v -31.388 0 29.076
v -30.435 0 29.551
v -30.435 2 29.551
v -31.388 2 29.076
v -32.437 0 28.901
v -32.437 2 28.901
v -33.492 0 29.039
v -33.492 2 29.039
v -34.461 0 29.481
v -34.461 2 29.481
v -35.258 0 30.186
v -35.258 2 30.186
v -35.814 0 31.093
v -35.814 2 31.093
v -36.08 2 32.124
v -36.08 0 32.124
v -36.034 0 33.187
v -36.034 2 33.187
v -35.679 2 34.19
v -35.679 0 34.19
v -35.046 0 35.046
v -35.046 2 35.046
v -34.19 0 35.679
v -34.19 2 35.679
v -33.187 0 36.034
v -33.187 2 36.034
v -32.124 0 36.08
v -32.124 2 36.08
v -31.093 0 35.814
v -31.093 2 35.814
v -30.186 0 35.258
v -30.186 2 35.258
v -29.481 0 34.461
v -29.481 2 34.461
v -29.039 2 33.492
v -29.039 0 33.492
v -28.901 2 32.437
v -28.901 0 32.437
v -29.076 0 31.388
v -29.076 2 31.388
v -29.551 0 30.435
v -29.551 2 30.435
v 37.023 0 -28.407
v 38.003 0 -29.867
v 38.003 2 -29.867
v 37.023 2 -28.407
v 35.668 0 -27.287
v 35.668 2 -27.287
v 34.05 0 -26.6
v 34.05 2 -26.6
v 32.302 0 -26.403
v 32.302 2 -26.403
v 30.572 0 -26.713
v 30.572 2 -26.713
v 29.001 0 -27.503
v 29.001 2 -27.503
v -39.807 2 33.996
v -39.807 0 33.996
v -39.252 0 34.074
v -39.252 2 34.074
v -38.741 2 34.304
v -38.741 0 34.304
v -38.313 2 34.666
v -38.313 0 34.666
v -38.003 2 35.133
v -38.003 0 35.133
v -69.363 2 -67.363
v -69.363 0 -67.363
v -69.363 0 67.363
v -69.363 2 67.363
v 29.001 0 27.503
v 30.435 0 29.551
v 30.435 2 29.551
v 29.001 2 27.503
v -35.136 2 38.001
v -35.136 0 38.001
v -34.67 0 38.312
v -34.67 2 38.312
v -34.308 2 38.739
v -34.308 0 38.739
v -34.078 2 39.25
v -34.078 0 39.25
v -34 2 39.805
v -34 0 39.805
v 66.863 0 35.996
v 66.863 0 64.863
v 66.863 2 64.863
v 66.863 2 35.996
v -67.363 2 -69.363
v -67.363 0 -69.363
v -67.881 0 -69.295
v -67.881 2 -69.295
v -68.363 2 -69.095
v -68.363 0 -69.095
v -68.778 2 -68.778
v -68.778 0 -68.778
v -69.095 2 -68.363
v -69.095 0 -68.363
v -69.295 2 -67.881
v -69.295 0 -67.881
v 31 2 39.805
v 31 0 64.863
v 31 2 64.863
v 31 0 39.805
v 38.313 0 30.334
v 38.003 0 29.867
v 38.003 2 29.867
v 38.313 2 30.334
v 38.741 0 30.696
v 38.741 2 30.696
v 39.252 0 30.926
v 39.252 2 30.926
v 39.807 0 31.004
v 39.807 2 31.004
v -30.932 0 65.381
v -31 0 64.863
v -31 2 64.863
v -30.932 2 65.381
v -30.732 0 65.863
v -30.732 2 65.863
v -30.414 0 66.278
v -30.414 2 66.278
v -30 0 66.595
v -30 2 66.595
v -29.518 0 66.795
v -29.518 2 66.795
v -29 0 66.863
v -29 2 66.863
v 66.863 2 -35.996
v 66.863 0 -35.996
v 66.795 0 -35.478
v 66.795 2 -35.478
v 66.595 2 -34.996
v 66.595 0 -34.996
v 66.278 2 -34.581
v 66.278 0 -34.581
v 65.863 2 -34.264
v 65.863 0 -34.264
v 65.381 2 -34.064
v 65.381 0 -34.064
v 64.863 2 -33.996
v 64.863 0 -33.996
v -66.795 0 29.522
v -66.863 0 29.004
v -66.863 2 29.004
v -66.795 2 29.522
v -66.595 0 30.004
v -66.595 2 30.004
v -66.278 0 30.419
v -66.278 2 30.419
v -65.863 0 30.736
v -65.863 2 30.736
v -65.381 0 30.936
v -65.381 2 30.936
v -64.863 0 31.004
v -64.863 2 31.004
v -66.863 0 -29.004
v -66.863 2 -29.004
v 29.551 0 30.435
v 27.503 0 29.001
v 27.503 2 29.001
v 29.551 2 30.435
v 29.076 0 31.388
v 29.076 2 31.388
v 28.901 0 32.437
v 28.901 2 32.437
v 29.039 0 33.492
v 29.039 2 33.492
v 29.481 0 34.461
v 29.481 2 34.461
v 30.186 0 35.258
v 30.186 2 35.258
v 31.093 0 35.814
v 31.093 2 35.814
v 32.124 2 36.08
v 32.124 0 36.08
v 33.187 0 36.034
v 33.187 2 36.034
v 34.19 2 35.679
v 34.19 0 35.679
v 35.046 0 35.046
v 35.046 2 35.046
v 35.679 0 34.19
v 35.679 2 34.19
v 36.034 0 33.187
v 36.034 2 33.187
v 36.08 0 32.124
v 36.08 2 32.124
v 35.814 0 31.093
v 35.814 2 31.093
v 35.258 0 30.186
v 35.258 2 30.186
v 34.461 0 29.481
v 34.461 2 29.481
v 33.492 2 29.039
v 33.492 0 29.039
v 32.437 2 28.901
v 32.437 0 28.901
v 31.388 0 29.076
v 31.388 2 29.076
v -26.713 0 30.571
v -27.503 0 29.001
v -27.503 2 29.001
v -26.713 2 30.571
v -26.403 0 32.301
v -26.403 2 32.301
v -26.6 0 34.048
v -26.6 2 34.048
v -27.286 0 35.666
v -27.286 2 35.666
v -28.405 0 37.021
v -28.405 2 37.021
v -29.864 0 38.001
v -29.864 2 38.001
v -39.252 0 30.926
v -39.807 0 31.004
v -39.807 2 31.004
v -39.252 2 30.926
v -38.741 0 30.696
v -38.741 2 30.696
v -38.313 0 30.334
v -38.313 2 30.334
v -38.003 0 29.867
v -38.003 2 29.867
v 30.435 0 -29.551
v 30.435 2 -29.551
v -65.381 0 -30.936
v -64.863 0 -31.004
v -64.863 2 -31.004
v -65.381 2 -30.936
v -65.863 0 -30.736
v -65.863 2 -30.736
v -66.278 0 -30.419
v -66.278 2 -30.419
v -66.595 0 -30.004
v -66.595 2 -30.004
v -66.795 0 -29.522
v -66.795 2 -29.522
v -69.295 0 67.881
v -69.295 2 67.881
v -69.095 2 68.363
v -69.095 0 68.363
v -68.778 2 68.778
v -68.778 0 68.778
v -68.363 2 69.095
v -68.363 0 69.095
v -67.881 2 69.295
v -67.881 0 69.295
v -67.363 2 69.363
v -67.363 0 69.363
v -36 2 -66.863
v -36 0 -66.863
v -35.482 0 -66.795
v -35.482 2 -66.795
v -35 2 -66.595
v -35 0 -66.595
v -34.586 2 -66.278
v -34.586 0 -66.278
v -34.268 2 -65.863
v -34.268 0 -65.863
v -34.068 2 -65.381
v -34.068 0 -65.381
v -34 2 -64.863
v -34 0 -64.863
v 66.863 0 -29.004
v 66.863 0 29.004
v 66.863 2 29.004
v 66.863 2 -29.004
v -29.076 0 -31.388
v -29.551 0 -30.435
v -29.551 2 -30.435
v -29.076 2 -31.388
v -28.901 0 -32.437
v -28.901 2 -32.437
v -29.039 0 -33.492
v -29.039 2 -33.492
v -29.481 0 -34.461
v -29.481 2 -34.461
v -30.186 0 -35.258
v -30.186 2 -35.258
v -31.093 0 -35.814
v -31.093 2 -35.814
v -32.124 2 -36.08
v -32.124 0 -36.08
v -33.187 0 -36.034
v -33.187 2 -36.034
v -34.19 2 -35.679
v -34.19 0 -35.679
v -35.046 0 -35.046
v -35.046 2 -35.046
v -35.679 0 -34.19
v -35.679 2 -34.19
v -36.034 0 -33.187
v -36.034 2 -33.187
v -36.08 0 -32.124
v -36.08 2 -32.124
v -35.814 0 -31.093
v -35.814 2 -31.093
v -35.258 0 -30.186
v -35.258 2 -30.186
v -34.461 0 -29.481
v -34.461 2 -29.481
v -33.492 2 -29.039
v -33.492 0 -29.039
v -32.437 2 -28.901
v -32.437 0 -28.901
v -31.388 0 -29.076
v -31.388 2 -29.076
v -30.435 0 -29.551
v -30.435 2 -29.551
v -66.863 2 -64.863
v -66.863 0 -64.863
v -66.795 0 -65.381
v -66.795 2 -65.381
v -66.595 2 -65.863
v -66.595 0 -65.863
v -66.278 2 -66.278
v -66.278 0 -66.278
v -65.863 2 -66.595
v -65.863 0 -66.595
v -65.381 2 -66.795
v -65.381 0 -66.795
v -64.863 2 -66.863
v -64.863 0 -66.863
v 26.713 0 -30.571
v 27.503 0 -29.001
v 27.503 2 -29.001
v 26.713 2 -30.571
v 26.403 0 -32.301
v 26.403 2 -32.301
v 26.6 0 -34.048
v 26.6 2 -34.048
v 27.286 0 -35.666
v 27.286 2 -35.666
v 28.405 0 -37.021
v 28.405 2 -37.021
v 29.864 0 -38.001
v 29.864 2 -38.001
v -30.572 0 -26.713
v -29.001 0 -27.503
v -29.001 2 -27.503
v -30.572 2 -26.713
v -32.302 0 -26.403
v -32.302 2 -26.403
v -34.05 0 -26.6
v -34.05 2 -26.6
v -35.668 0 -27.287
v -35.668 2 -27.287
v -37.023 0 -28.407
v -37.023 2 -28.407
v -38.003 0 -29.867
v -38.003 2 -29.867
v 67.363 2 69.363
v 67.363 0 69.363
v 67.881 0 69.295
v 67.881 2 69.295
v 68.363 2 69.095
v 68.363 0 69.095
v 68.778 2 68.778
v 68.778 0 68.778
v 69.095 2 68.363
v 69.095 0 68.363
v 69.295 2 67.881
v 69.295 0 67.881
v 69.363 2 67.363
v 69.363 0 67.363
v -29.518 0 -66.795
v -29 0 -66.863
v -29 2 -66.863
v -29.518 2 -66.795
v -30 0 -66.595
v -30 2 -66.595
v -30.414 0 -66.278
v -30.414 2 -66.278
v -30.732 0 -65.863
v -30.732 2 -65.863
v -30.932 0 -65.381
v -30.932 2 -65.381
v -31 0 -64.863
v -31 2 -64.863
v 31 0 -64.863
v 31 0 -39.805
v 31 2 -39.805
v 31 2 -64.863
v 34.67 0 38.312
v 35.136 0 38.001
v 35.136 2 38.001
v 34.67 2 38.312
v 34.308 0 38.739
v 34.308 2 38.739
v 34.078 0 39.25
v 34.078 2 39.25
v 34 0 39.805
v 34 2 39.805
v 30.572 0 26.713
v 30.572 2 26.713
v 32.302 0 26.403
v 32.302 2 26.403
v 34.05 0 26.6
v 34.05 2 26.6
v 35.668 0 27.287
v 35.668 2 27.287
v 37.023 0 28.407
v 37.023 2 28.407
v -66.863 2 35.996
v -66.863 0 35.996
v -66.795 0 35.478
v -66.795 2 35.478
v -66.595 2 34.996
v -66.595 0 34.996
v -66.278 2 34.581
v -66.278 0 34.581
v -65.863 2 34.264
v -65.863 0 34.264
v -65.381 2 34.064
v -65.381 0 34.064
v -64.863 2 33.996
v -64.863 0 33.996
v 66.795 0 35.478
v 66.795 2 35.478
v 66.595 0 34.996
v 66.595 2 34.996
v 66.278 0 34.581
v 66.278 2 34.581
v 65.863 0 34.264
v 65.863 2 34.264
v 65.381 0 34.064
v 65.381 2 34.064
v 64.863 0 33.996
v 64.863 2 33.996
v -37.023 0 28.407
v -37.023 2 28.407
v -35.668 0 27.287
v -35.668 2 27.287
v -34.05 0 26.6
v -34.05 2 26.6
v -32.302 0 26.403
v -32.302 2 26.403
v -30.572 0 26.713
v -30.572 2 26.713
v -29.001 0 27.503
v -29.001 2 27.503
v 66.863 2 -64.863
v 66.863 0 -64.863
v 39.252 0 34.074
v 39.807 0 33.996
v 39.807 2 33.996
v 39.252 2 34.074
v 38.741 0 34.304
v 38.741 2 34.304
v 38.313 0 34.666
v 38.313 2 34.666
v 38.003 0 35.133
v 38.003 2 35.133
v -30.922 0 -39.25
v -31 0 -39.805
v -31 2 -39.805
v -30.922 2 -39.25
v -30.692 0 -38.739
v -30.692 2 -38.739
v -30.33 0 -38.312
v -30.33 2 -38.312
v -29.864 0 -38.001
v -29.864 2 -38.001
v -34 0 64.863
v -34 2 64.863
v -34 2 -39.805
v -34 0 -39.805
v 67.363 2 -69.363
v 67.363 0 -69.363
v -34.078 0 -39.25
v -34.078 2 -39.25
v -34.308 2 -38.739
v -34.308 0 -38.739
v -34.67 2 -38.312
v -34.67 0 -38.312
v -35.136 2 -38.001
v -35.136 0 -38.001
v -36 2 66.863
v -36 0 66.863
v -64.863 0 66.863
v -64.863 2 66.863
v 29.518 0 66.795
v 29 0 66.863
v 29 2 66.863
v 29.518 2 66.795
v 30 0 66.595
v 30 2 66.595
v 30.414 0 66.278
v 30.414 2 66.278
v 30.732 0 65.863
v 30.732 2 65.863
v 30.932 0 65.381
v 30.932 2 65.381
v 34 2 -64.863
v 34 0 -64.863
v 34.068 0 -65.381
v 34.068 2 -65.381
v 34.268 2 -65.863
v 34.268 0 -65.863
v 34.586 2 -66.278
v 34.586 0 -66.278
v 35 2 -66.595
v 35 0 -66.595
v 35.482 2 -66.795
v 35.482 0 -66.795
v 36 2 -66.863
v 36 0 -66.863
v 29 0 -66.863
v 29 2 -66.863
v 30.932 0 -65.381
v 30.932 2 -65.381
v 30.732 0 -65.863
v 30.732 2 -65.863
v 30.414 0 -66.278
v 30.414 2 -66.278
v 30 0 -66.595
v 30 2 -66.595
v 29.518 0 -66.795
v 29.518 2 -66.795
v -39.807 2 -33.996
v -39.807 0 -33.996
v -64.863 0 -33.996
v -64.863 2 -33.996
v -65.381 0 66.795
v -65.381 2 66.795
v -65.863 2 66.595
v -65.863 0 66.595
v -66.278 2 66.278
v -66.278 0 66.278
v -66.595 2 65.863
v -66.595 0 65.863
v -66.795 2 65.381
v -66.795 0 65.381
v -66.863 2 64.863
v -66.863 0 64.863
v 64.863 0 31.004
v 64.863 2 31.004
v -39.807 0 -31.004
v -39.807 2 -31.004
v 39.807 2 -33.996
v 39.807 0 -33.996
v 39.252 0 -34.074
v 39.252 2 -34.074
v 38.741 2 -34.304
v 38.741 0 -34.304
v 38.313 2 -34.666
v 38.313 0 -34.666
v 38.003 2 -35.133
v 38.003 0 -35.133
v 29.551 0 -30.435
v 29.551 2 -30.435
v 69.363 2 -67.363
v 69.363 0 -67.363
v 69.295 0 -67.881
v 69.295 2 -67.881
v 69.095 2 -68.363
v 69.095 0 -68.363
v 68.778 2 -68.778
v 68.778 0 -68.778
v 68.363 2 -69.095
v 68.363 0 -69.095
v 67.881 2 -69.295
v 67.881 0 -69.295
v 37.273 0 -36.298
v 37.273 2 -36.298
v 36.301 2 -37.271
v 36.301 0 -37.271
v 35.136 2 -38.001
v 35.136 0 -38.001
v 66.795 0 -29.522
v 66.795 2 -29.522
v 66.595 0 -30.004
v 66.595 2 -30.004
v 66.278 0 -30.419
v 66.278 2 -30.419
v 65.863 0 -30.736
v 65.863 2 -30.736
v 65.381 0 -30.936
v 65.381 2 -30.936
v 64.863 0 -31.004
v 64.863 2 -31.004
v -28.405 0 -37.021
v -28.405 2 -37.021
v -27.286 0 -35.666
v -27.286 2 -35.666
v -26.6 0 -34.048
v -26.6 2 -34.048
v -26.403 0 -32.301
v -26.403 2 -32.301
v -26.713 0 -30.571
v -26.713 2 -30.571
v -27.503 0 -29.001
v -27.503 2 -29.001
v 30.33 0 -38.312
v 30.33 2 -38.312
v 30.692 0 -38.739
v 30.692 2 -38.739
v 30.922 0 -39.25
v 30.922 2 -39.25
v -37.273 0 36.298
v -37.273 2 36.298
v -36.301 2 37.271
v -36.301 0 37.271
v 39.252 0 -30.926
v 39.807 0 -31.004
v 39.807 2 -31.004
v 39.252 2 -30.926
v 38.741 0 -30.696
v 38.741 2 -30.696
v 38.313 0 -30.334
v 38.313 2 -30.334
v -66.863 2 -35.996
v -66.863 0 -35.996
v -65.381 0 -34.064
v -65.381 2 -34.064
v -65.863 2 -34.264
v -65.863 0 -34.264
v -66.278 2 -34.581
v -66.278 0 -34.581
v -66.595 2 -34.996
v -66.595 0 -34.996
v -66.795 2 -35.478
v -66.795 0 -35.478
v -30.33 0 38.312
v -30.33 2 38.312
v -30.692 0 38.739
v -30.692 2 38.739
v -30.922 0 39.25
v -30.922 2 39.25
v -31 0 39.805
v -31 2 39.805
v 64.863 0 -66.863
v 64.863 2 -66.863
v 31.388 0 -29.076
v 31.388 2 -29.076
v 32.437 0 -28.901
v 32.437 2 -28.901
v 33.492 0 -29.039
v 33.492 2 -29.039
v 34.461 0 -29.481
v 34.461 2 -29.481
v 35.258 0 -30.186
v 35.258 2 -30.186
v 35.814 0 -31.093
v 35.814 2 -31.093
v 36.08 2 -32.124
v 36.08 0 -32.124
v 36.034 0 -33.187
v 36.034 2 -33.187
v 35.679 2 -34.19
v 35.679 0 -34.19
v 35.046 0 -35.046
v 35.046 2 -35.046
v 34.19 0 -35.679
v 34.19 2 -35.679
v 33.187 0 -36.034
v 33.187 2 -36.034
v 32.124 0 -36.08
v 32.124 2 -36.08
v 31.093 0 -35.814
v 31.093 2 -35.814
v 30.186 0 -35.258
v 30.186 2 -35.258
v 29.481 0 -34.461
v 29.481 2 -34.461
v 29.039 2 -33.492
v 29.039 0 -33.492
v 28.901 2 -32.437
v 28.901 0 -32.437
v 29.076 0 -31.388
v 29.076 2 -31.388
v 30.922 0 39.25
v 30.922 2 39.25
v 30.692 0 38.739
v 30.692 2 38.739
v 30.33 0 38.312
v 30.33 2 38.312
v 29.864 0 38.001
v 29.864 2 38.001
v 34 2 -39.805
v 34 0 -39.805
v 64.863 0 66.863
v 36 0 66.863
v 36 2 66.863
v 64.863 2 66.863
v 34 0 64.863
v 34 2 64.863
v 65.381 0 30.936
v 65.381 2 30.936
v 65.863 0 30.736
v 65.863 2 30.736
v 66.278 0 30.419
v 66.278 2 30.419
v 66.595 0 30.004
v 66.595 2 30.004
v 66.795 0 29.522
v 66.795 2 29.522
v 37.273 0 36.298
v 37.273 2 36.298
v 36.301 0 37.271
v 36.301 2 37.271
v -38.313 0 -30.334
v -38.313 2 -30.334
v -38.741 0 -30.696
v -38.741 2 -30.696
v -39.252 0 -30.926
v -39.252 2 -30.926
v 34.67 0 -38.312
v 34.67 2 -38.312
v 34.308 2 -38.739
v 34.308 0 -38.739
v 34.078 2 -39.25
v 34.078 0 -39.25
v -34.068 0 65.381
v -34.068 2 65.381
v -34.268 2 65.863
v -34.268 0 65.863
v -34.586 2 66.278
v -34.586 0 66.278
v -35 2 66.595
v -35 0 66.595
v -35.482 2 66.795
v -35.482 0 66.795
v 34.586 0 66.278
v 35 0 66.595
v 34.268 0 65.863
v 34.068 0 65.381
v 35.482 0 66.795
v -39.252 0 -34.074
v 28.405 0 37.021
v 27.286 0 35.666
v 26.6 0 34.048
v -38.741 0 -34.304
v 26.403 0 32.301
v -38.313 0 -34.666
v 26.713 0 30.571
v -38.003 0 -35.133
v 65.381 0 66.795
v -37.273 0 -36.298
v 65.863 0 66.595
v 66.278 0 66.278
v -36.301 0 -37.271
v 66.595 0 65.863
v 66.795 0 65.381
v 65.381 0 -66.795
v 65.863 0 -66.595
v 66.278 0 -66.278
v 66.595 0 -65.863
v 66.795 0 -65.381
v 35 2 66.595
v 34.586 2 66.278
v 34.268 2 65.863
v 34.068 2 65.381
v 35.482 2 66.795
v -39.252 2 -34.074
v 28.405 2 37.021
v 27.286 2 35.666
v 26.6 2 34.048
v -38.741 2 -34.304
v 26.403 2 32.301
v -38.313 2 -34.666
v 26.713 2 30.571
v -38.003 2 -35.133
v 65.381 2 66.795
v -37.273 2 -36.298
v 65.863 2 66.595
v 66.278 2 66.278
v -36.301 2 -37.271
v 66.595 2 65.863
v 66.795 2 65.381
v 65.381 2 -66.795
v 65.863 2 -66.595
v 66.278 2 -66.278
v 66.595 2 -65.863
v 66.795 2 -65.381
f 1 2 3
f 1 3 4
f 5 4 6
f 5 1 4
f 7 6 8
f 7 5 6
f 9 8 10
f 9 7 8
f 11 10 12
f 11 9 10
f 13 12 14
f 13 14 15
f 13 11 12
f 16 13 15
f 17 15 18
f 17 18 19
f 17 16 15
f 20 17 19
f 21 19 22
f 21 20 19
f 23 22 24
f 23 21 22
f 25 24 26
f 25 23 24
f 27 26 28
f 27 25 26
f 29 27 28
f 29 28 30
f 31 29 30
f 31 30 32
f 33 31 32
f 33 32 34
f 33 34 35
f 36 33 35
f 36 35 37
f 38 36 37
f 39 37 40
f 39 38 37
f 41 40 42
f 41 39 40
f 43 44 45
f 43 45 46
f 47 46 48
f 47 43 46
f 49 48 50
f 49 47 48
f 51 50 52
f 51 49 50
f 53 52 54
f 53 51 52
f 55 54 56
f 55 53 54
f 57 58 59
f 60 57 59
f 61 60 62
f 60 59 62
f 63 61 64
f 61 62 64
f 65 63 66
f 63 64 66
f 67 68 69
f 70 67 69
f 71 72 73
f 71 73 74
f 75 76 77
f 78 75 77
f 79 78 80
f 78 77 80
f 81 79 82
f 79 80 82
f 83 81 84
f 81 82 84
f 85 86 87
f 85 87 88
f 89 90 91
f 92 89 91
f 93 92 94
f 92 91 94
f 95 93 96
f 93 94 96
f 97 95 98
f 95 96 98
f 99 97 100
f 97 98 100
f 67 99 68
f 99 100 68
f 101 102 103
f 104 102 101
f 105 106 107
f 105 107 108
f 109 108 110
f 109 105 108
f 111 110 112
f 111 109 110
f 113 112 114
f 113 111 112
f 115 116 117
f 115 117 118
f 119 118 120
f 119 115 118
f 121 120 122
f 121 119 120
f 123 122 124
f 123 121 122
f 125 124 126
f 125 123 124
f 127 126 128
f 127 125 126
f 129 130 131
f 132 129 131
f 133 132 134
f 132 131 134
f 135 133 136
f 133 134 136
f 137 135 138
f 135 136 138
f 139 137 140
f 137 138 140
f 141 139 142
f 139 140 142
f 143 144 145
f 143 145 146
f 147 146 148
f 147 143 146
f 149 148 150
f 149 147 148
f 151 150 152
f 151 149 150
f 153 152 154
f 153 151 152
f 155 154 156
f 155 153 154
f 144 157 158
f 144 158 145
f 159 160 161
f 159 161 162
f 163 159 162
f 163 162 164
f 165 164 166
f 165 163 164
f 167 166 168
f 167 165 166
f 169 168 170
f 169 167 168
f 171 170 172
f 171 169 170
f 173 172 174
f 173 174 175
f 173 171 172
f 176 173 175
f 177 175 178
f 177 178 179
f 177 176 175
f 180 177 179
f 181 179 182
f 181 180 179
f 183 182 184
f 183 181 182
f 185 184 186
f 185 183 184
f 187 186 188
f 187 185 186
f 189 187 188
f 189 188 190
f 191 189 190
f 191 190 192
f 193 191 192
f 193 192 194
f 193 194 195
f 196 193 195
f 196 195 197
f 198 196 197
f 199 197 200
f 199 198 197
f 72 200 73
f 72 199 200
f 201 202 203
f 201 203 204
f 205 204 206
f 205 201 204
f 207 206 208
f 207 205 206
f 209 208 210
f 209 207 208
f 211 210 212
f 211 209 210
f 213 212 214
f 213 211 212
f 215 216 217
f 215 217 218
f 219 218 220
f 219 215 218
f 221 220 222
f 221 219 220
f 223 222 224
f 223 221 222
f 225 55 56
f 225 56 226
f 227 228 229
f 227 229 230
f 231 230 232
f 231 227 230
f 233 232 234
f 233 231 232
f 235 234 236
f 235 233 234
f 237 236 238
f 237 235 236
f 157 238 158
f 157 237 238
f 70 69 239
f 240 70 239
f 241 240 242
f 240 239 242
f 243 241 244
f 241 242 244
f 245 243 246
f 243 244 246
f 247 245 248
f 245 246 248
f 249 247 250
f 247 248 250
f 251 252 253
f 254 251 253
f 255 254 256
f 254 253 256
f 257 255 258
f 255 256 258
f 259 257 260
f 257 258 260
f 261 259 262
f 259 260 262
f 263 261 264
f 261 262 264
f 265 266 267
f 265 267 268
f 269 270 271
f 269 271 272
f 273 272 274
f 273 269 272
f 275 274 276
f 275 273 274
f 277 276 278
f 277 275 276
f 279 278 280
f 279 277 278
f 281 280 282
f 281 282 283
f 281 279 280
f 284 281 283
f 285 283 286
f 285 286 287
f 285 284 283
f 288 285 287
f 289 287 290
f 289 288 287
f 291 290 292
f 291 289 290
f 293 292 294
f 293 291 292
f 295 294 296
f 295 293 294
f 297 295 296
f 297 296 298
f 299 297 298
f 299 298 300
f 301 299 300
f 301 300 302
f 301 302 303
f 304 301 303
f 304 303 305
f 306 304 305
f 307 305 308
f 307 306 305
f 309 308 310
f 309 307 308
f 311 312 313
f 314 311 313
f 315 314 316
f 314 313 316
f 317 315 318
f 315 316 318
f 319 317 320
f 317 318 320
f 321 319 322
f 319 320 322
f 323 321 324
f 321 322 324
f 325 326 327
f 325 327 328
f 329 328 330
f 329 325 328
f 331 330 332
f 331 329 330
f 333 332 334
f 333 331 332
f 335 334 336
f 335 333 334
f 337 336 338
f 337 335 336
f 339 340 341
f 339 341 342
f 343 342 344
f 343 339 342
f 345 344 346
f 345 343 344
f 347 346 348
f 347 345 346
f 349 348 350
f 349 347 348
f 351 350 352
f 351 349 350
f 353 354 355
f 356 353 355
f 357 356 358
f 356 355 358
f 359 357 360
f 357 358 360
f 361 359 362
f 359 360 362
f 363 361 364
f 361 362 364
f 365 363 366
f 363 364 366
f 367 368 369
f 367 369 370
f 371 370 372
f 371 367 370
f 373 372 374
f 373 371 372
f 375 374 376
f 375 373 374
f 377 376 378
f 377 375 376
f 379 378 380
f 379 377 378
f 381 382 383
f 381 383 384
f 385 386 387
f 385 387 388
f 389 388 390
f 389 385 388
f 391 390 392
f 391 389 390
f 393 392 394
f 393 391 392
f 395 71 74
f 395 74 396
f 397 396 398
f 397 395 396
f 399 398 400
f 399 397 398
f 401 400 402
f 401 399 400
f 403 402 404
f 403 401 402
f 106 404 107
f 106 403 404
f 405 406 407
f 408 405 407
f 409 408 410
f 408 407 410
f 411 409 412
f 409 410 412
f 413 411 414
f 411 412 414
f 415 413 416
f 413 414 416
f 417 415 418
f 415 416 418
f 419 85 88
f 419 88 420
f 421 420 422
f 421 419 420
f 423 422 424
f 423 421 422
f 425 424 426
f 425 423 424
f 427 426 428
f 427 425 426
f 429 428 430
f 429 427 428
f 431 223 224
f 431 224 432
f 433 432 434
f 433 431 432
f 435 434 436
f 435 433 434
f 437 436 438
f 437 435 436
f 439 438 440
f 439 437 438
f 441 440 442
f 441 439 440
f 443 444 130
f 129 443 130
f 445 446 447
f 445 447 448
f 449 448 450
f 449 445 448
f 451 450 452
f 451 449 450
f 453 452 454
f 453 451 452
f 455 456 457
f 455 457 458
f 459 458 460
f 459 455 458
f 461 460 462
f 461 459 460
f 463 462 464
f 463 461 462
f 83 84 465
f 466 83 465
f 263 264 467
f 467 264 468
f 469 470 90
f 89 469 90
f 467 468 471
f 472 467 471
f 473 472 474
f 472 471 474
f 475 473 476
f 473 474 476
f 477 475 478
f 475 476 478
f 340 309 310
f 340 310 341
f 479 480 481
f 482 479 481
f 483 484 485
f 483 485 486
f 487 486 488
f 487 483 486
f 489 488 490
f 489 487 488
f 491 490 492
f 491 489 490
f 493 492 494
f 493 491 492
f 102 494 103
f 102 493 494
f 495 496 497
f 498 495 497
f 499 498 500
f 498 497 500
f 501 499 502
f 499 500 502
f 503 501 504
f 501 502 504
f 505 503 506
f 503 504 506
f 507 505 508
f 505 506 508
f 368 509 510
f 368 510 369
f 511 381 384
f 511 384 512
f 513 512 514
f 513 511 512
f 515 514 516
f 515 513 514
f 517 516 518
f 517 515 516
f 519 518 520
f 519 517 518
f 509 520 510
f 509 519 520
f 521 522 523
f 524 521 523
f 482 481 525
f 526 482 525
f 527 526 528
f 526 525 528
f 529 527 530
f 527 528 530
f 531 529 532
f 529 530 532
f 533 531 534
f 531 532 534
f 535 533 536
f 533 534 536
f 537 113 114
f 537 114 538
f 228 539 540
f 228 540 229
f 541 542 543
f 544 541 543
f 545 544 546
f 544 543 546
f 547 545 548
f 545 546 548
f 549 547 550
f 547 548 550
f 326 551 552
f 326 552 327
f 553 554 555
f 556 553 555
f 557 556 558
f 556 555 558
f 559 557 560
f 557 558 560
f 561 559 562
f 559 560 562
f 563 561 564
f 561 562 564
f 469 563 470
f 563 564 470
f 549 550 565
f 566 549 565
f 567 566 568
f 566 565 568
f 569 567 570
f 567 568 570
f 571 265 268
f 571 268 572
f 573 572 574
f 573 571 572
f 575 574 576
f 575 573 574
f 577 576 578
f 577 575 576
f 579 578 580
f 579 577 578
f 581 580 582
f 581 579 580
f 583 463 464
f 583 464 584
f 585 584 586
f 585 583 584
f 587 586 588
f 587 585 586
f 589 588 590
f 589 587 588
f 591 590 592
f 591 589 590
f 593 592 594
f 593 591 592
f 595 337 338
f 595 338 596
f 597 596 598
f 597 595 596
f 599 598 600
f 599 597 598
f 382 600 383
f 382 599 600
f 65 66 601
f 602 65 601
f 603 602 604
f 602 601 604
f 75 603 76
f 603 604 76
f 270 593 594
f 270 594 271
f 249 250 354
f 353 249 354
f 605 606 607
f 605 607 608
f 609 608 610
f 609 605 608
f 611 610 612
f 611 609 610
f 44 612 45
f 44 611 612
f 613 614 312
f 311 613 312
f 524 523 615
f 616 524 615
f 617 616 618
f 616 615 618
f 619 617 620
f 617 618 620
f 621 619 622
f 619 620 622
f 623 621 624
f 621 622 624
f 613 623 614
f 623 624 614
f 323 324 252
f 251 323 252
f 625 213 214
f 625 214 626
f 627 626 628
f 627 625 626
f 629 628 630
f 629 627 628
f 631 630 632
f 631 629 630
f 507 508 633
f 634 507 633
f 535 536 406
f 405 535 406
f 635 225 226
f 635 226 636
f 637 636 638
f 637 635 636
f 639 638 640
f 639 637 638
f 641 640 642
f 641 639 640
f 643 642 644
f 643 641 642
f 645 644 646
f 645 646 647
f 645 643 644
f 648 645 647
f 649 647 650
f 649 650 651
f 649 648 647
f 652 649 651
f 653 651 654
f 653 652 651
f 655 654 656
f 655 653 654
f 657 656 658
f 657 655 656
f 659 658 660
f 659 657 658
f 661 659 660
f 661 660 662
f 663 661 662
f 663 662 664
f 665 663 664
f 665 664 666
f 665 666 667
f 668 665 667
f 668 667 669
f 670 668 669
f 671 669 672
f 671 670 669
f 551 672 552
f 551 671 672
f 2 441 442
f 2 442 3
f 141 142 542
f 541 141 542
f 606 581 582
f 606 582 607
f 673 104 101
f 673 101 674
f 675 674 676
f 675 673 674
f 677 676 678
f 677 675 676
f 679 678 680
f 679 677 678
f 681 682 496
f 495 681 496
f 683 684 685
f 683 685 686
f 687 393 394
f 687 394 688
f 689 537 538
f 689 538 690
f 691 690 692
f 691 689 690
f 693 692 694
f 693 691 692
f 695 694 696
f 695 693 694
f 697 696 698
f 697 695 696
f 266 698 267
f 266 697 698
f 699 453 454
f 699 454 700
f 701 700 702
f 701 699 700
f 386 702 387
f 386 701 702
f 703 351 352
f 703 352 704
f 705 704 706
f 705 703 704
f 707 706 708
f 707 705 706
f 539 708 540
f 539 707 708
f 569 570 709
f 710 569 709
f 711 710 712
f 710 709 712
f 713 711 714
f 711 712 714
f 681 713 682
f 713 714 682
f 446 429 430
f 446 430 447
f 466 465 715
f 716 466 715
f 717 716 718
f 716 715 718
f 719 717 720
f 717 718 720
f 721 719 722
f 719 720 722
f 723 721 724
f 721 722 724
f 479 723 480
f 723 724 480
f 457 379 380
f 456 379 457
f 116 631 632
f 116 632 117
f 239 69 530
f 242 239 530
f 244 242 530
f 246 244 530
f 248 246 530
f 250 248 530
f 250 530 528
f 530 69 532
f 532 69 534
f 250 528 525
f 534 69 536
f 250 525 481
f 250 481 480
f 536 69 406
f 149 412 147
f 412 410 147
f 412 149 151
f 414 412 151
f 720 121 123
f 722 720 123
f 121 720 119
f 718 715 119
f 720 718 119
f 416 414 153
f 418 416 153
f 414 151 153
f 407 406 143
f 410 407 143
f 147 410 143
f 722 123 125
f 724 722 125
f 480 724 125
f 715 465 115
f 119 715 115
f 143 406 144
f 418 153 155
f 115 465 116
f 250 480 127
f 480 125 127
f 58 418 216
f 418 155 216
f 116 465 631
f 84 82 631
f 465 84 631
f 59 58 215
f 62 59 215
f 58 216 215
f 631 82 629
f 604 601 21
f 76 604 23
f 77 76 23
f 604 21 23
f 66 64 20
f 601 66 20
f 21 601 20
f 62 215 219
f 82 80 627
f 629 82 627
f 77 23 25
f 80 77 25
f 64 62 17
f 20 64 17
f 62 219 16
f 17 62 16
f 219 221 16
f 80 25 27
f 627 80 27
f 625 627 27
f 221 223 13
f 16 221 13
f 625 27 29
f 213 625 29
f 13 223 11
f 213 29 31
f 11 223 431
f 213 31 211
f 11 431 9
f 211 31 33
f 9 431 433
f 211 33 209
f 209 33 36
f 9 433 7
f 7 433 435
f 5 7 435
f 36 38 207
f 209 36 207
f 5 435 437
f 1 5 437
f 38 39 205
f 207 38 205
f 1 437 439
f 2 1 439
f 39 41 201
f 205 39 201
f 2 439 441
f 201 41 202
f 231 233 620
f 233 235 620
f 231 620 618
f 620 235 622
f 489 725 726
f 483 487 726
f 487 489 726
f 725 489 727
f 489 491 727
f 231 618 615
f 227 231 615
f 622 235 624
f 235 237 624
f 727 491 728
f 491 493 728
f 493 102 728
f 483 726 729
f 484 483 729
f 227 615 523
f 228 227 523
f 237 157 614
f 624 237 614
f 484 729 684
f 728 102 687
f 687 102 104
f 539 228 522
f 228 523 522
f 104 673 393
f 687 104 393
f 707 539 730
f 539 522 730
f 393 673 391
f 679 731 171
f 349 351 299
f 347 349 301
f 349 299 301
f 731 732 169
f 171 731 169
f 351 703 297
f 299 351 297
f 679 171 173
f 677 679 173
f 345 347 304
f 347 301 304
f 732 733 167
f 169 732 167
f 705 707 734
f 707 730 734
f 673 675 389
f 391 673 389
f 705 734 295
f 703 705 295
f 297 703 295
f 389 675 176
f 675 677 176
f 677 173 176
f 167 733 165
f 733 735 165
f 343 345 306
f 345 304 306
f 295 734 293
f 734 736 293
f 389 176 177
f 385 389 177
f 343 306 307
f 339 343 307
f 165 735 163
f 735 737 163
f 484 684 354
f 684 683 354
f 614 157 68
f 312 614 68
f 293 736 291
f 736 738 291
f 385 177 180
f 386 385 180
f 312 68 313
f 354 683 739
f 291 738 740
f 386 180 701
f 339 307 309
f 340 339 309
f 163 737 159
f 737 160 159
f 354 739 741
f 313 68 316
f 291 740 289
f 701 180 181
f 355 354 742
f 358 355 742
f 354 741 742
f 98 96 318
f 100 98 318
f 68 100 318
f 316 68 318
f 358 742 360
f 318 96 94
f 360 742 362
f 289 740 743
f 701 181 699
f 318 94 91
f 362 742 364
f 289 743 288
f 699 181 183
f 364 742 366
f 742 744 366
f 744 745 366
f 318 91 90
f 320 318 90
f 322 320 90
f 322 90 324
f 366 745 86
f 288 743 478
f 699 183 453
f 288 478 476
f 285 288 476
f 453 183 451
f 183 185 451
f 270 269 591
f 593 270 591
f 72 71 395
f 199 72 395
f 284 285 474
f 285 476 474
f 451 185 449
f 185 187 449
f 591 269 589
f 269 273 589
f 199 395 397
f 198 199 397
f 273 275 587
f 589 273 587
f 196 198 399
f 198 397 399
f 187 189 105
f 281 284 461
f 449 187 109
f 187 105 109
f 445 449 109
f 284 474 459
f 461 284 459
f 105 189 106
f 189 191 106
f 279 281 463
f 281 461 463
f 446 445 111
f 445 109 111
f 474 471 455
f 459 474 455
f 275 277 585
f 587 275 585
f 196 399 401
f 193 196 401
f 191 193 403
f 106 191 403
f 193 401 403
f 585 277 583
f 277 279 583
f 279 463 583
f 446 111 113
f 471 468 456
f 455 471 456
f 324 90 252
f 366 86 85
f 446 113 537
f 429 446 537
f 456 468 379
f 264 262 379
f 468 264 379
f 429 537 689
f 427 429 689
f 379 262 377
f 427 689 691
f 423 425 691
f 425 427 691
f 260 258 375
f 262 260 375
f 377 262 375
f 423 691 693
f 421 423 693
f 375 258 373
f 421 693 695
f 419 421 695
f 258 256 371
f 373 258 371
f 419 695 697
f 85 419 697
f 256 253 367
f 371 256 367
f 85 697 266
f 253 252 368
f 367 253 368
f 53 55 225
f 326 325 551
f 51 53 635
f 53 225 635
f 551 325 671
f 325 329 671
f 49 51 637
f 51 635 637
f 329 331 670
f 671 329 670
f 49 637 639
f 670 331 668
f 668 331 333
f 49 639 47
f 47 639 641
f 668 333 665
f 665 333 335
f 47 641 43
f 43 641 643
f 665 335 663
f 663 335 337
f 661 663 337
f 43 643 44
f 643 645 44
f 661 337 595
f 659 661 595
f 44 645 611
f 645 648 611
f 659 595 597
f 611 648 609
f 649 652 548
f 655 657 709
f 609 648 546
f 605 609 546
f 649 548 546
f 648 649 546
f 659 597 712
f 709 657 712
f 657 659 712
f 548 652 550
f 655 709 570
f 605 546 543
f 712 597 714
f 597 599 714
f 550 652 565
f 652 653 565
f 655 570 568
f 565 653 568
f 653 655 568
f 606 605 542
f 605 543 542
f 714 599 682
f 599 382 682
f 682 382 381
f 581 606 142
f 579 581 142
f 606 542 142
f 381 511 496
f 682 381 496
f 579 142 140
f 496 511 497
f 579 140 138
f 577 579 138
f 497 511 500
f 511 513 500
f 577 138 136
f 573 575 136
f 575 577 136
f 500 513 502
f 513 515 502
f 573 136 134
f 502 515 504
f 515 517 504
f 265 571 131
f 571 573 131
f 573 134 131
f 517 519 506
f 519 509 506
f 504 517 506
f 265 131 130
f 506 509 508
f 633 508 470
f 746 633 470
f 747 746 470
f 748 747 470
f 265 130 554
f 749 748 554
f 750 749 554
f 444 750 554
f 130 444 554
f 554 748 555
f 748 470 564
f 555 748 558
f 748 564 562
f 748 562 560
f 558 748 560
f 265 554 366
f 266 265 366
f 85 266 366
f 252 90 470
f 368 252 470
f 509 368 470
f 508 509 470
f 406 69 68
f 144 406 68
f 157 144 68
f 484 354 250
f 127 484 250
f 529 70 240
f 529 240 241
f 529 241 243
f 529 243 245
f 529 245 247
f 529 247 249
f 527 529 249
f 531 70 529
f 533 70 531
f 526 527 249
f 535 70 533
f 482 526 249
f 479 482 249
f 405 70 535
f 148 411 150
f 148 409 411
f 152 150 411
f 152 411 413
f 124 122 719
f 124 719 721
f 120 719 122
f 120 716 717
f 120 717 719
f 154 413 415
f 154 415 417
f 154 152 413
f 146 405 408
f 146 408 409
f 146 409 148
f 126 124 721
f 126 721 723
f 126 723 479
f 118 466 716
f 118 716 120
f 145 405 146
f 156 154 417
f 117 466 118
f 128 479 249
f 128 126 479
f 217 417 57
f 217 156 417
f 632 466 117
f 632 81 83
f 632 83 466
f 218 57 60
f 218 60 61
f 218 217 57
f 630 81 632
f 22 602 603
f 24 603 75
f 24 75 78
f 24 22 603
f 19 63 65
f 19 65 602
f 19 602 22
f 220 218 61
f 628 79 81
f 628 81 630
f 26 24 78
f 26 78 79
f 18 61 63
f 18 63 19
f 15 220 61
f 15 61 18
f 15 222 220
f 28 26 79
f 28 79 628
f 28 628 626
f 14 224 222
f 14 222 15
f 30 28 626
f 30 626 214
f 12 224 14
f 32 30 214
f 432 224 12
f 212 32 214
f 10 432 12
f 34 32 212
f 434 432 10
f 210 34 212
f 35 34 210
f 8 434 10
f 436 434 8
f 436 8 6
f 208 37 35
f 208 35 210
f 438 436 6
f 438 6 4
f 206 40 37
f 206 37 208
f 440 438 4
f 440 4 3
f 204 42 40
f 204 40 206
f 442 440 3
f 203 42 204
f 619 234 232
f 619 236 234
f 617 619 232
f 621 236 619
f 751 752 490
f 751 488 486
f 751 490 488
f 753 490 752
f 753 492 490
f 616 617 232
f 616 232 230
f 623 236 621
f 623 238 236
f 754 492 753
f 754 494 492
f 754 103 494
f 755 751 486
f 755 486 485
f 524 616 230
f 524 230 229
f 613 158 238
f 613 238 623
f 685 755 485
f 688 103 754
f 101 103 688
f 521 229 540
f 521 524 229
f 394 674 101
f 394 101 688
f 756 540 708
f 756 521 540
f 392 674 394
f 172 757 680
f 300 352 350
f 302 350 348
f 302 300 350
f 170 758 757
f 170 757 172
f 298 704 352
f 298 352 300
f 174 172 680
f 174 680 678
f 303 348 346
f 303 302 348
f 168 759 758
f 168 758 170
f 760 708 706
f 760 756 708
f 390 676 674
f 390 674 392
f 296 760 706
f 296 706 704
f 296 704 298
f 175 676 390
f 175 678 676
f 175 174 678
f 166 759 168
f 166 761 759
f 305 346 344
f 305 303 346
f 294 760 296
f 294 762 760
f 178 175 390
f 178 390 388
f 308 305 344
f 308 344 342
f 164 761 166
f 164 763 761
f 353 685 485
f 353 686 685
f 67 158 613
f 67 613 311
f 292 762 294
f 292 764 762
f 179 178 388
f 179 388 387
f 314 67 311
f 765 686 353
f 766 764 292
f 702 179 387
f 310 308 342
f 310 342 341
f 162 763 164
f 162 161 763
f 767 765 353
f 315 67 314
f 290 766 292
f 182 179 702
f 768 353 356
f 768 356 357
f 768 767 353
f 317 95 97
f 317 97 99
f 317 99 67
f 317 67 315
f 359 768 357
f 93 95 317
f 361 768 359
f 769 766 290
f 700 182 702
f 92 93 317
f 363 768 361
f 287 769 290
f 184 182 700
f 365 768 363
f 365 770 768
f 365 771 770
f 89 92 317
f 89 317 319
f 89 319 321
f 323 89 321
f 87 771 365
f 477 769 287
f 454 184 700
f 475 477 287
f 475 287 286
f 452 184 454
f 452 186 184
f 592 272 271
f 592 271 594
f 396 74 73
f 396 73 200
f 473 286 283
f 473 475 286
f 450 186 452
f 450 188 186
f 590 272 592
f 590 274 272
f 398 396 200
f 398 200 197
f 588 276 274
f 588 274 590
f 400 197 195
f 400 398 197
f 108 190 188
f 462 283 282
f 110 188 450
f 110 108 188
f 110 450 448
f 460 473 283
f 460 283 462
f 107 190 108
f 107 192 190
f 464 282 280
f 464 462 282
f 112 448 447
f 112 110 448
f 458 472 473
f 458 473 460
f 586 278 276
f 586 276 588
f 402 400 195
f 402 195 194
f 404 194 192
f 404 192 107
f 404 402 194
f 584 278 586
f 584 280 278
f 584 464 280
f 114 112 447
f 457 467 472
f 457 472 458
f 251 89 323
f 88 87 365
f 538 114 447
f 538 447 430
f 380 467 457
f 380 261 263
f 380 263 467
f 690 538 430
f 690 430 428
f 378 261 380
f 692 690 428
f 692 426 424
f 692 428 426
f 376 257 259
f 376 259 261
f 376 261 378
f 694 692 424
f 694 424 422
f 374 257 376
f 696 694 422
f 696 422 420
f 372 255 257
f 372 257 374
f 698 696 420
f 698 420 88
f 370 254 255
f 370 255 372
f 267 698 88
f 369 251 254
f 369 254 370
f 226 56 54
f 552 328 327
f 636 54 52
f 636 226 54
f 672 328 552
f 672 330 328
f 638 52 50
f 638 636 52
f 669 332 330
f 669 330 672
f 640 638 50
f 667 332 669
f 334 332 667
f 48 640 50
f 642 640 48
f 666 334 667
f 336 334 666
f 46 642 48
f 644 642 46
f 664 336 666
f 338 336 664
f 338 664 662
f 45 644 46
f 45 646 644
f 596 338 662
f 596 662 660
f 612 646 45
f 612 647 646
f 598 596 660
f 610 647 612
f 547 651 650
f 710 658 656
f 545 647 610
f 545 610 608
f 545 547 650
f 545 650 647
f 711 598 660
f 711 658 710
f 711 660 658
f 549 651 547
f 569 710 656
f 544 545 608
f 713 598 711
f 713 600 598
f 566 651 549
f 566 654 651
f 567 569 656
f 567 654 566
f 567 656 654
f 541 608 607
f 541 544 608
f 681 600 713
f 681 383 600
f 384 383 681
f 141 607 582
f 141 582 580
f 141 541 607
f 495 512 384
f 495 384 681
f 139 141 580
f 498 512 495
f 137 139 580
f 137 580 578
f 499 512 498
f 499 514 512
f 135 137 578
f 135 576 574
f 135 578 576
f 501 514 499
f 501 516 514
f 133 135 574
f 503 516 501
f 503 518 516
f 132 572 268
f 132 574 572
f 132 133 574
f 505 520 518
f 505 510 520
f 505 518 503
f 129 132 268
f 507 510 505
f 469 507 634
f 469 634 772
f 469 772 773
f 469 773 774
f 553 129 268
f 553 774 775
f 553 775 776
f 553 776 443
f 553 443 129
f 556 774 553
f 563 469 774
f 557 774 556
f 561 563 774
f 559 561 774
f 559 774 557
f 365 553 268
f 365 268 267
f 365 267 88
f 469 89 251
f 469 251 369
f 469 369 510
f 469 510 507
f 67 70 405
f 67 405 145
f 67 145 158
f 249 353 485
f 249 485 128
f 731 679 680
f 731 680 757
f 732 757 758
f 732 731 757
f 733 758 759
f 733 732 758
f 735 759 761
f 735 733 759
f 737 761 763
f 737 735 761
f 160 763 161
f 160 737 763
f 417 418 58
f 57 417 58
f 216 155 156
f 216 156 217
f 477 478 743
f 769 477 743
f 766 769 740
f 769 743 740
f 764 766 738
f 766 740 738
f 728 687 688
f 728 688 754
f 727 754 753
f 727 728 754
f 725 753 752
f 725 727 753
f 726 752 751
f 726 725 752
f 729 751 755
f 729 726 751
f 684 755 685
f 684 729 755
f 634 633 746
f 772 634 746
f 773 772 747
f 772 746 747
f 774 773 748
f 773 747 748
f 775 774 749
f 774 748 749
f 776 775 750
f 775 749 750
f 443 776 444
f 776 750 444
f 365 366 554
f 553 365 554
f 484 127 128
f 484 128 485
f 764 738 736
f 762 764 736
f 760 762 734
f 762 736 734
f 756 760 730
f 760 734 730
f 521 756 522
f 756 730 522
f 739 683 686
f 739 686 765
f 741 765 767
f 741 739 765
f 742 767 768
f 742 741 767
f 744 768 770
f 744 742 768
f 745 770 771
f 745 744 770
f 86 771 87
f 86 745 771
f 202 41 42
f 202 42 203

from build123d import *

# Parameters (mm, degrees)
BOSS_EXTRUDE2_DEPTH = 2


with BuildPart() as part:
    # Sketch1 → Boss-Extrude2 (new body)
    with BuildSketch(Plane(origin=(0, 0, 0), x_dir=(1, 0, 0), z_dir=(0, 1, 0))):
        with BuildLine():
            Line((69.363368179, -67.363368179), (69.363368179, 67.363368179))
            ThreePointArc((69.363368179, 67.363368179), (68.777581741, 68.777581741), (67.363368179, 69.363368179))
            Line((67.363368179, 69.363368179), (-67.363368179, 69.363368179))
            ThreePointArc((-67.363368179, 69.363368179), (-68.777581741, 68.777581741), (-69.363368179, 67.363368179))
            Line((-69.363368179, 67.363368179), (-69.363368179, -67.363368179))
            ThreePointArc((-69.363368179, -67.363368179), (-68.777581741, -68.777581741), (-67.363368179, -69.363368179))
            Line((-67.363368179, -69.363368179), (67.363368179, -69.363368179))
            ThreePointArc((67.363368179, -69.363368179), (68.777581741, -68.777581741), (69.363368179, -67.363368179))
        make_face()
        with BuildLine():
            Line((66.863368179, -64.863368179), (66.863368179, -35.99568434))
            ThreePointArc((66.863368179, -35.99568434), (66.277581741, -34.581470778), (64.863368179, -33.99568434))
            Line((64.863368179, -33.99568434), (39.806859174, -33.99568434))
            ThreePointArc((39.806859174, -33.99568434), (38.740619021, -34.303605165), (38.002696415, -35.132552404))
            ThreePointArc((38.002696415, -35.132552404), (36.814625157, -36.812077197), (35.135802469, -38.001140368))
            ThreePointArc((35.135802469, -38.001140368), (34.307605976, -38.739052609), (34, -39.804792947))
            Line((34, -39.804792947), (34, -64.863368179))
            ThreePointArc((34, -64.863368179), (34.585786438, -66.277581741), (36, -66.863368179))
            Line((36, -66.863368179), (64.863368179, -66.863368179))
            ThreePointArc((64.863368179, -66.863368179), (66.277581741, -66.277581741), (66.863368179, -64.863368179))
        make_face(mode=Mode.SUBTRACT)
        with BuildLine():
            Line((-64.863368179, 66.863368179), (-36, 66.863368179))
            ThreePointArc((-36, 66.863368179), (-34.585786438, 66.277581741), (-34, 64.863368179))
            Line((-34, 64.863368179), (-34, 39.804792947))
            ThreePointArc((-34, 39.804792947), (-34.307605976, 38.739052609), (-35.135802469, 38.001140368))
            ThreePointArc((-35.135802469, 38.001140368), (-36.814625157, 36.812077197), (-38.002696415, 35.132552404))
            ThreePointArc((-38.002696415, 35.132552404), (-38.740619021, 34.303605165), (-39.806859174, 33.99568434))
            Line((-39.806859174, 33.99568434), (-64.863368179, 33.99568434))
            ThreePointArc((-64.863368179, 33.99568434), (-66.277581741, 34.581470778), (-66.863368179, 35.99568434))
            Line((-66.863368179, 35.99568434), (-66.863368179, 64.863368179))
            ThreePointArc((-66.863368179, 64.863368179), (-66.277581741, 66.277581741), (-64.863368179, 66.863368179))
        make_face(mode=Mode.SUBTRACT)
        with BuildLine():
            Line((-66.863368179, -64.863368179), (-66.863368179, -35.99568434))
            ThreePointArc((-66.863368179, -35.99568434), (-66.277581741, -34.581470778), (-64.863368179, -33.99568434))
            Line((-64.863368179, -33.99568434), (-39.806859174, -33.99568434))
            ThreePointArc((-39.806859174, -33.99568434), (-38.740619021, -34.303605165), (-38.002696415, -35.132552404))
            ThreePointArc((-38.002696415, -35.132552404), (-36.814625157, -36.812077197), (-35.135802469, -38.001140368))
            ThreePointArc((-35.135802469, -38.001140368), (-34.307605976, -38.739052609), (-34, -39.804792947))
            Line((-34, -39.804792947), (-34, -64.863368179))
            ThreePointArc((-34, -64.863368179), (-34.585786438, -66.277581741), (-36, -66.863368179))
            Line((-36, -66.863368179), (-64.863368179, -66.863368179))
            ThreePointArc((-64.863368179, -66.863368179), (-66.277581741, -66.277581741), (-66.863368179, -64.863368179))
        make_face(mode=Mode.SUBTRACT)
        with BuildLine():
            Line((36, 66.863368179), (64.863368179, 66.863368179))
            ThreePointArc((64.863368179, 66.863368179), (66.277581741, 66.277581741), (66.863368179, 64.863368179))
            Line((66.863368179, 64.863368179), (66.863368179, 35.99568434))
            ThreePointArc((66.863368179, 35.99568434), (66.277581741, 34.581470778), (64.863368179, 33.99568434))
            Line((64.863368179, 33.99568434), (39.806859174, 33.99568434))
            ThreePointArc((39.806859174, 33.99568434), (38.740619021, 34.303605165), (38.002696415, 35.132552404))
            ThreePointArc((38.002696415, 35.132552404), (36.814625157, 36.812077197), (35.135802469, 38.001140368))
            ThreePointArc((35.135802469, 38.001140368), (34.307605976, 38.739052609), (34, 39.804792947))
            Line((34, 39.804792947), (34, 64.863368179))
            ThreePointArc((34, 64.863368179), (34.585786438, 66.277581741), (36, 66.863368179))
        make_face(mode=Mode.SUBTRACT)
        with BuildLine():
            Line((-30.435124829, 29.551052641), (-29.001183738, 27.50317253))
            ThreePointArc((-29.001183738, 27.50317253), (-34.049623523, 26.600112973), (-38.002696415, 29.867447596))
            ThreePointArc((-38.002696415, 29.867447596), (-38.740619021, 30.696394835), (-39.806859174, 31.00431566))
            Line((-39.806859174, 31.00431566), (-64.863368179, 31.00431566))
            ThreePointArc((-64.863368179, 31.00431566), (-66.277581741, 30.418529222), (-66.863368179, 29.00431566))
            Line((-66.863368179, 29.00431566), (-66.863368179, -29.00431566))
            ThreePointArc((-66.863368179, -29.00431566), (-66.277581741, -30.418529222), (-64.863368179, -31.00431566))
            Line((-64.863368179, -31.00431566), (-39.806859174, -31.00431566))
            ThreePointArc((-39.806859174, -31.00431566), (-38.740619021, -30.696394835), (-38.002696415, -29.867447596))
            ThreePointArc((-38.002696415, -29.867447596), (-34.049623523, -26.600112973), (-29.001183738, -27.50317253))
            Line((-29.001183738, -27.50317253), (-30.435124829, -29.551052641))
            ThreePointArc((-30.435124829, -29.551052641), (-35.045584412, -35.045584412), (-29.551052641, -30.435124829))
            Line((-29.551052641, -30.435124829), (-27.50317253, -29.001183738))
            ThreePointArc((-27.50317253, -29.001183738), (-26.599655537, -34.04788088), (-29.864197531, -38.001140368))
            ThreePointArc((-29.864197531, -38.001140368), (-30.692394024, -38.739052609), (-31, -39.804792947))
            Line((-31, -39.804792947), (-31, -64.863368179))
            ThreePointArc((-31, -64.863368179), (-30.414213562, -66.277581741), (-29, -66.863368179))
            Line((-29, -66.863368179), (29, -66.863368179))
            ThreePointArc((29, -66.863368179), (30.414213562, -66.277581741), (31, -64.863368179))
            Line((31, -64.863368179), (31, -39.804792947))
            ThreePointArc((31, -39.804792947), (30.692394024, -38.739052609), (29.864197531, -38.001140368))
            ThreePointArc((29.864197531, -38.001140368), (26.599655537, -34.04788088), (27.50317253, -29.001183738))
            Line((27.50317253, -29.001183738), (29.551052641, -30.435124829))
            ThreePointArc((29.551052641, -30.435124829), (35.045584412, -35.045584412), (30.435124829, -29.551052641))
            Line((30.435124829, -29.551052641), (29.001183738, -27.50317253))
            ThreePointArc((29.001183738, -27.50317253), (34.049623523, -26.600112973), (38.002696415, -29.867447596))
            ThreePointArc((38.002696415, -29.867447596), (38.740619021, -30.696394835), (39.806859174, -31.00431566))
            Line((39.806859174, -31.00431566), (64.863368179, -31.00431566))
            ThreePointArc((64.863368179, -31.00431566), (66.277581741, -30.418529222), (66.863368179, -29.00431566))
            Line((66.863368179, -29.00431566), (66.863368179, 29.00431566))
            ThreePointArc((66.863368179, 29.00431566), (66.277581741, 30.418529222), (64.863368179, 31.00431566))
            Line((64.863368179, 31.00431566), (39.806859174, 31.00431566))
            ThreePointArc((39.806859174, 31.00431566), (38.740619021, 30.696394835), (38.002696415, 29.867447596))
            ThreePointArc((38.002696415, 29.867447596), (34.049623523, 26.600112973), (29.001183738, 27.50317253))
            Line((29.001183738, 27.50317253), (30.435124829, 29.551052641))
            ThreePointArc((30.435124829, 29.551052641), (35.045584412, 35.045584412), (29.551052641, 30.435124829))
            Line((29.551052641, 30.435124829), (27.50317253, 29.001183738))
            ThreePointArc((27.50317253, 29.001183738), (26.599655537, 34.04788088), (29.864197531, 38.001140368))
            ThreePointArc((29.864197531, 38.001140368), (30.692394024, 38.739052609), (31, 39.804792947))
            Line((31, 39.804792947), (31, 64.863368179))
            ThreePointArc((31, 64.863368179), (30.414213562, 66.277581741), (29, 66.863368179))
            Line((29, 66.863368179), (-29, 66.863368179))
            ThreePointArc((-29, 66.863368179), (-30.414213562, 66.277581741), (-31, 64.863368179))
            Line((-31, 64.863368179), (-31, 39.804792947))
            ThreePointArc((-31, 39.804792947), (-30.692394024, 38.739052609), (-29.864197531, 38.001140368))
            ThreePointArc((-29.864197531, 38.001140368), (-26.599655537, 34.04788088), (-27.50317253, 29.001183738))
            Line((-27.50317253, 29.001183738), (-29.551052641, 30.435124829))
            ThreePointArc((-29.551052641, 30.435124829), (-35.045584412, 35.045584412), (-30.435124829, 29.551052641))
        make_face(mode=Mode.SUBTRACT)
    extrude(amount=BOSS_EXTRUDE2_DEPTH)


solid = part.part
